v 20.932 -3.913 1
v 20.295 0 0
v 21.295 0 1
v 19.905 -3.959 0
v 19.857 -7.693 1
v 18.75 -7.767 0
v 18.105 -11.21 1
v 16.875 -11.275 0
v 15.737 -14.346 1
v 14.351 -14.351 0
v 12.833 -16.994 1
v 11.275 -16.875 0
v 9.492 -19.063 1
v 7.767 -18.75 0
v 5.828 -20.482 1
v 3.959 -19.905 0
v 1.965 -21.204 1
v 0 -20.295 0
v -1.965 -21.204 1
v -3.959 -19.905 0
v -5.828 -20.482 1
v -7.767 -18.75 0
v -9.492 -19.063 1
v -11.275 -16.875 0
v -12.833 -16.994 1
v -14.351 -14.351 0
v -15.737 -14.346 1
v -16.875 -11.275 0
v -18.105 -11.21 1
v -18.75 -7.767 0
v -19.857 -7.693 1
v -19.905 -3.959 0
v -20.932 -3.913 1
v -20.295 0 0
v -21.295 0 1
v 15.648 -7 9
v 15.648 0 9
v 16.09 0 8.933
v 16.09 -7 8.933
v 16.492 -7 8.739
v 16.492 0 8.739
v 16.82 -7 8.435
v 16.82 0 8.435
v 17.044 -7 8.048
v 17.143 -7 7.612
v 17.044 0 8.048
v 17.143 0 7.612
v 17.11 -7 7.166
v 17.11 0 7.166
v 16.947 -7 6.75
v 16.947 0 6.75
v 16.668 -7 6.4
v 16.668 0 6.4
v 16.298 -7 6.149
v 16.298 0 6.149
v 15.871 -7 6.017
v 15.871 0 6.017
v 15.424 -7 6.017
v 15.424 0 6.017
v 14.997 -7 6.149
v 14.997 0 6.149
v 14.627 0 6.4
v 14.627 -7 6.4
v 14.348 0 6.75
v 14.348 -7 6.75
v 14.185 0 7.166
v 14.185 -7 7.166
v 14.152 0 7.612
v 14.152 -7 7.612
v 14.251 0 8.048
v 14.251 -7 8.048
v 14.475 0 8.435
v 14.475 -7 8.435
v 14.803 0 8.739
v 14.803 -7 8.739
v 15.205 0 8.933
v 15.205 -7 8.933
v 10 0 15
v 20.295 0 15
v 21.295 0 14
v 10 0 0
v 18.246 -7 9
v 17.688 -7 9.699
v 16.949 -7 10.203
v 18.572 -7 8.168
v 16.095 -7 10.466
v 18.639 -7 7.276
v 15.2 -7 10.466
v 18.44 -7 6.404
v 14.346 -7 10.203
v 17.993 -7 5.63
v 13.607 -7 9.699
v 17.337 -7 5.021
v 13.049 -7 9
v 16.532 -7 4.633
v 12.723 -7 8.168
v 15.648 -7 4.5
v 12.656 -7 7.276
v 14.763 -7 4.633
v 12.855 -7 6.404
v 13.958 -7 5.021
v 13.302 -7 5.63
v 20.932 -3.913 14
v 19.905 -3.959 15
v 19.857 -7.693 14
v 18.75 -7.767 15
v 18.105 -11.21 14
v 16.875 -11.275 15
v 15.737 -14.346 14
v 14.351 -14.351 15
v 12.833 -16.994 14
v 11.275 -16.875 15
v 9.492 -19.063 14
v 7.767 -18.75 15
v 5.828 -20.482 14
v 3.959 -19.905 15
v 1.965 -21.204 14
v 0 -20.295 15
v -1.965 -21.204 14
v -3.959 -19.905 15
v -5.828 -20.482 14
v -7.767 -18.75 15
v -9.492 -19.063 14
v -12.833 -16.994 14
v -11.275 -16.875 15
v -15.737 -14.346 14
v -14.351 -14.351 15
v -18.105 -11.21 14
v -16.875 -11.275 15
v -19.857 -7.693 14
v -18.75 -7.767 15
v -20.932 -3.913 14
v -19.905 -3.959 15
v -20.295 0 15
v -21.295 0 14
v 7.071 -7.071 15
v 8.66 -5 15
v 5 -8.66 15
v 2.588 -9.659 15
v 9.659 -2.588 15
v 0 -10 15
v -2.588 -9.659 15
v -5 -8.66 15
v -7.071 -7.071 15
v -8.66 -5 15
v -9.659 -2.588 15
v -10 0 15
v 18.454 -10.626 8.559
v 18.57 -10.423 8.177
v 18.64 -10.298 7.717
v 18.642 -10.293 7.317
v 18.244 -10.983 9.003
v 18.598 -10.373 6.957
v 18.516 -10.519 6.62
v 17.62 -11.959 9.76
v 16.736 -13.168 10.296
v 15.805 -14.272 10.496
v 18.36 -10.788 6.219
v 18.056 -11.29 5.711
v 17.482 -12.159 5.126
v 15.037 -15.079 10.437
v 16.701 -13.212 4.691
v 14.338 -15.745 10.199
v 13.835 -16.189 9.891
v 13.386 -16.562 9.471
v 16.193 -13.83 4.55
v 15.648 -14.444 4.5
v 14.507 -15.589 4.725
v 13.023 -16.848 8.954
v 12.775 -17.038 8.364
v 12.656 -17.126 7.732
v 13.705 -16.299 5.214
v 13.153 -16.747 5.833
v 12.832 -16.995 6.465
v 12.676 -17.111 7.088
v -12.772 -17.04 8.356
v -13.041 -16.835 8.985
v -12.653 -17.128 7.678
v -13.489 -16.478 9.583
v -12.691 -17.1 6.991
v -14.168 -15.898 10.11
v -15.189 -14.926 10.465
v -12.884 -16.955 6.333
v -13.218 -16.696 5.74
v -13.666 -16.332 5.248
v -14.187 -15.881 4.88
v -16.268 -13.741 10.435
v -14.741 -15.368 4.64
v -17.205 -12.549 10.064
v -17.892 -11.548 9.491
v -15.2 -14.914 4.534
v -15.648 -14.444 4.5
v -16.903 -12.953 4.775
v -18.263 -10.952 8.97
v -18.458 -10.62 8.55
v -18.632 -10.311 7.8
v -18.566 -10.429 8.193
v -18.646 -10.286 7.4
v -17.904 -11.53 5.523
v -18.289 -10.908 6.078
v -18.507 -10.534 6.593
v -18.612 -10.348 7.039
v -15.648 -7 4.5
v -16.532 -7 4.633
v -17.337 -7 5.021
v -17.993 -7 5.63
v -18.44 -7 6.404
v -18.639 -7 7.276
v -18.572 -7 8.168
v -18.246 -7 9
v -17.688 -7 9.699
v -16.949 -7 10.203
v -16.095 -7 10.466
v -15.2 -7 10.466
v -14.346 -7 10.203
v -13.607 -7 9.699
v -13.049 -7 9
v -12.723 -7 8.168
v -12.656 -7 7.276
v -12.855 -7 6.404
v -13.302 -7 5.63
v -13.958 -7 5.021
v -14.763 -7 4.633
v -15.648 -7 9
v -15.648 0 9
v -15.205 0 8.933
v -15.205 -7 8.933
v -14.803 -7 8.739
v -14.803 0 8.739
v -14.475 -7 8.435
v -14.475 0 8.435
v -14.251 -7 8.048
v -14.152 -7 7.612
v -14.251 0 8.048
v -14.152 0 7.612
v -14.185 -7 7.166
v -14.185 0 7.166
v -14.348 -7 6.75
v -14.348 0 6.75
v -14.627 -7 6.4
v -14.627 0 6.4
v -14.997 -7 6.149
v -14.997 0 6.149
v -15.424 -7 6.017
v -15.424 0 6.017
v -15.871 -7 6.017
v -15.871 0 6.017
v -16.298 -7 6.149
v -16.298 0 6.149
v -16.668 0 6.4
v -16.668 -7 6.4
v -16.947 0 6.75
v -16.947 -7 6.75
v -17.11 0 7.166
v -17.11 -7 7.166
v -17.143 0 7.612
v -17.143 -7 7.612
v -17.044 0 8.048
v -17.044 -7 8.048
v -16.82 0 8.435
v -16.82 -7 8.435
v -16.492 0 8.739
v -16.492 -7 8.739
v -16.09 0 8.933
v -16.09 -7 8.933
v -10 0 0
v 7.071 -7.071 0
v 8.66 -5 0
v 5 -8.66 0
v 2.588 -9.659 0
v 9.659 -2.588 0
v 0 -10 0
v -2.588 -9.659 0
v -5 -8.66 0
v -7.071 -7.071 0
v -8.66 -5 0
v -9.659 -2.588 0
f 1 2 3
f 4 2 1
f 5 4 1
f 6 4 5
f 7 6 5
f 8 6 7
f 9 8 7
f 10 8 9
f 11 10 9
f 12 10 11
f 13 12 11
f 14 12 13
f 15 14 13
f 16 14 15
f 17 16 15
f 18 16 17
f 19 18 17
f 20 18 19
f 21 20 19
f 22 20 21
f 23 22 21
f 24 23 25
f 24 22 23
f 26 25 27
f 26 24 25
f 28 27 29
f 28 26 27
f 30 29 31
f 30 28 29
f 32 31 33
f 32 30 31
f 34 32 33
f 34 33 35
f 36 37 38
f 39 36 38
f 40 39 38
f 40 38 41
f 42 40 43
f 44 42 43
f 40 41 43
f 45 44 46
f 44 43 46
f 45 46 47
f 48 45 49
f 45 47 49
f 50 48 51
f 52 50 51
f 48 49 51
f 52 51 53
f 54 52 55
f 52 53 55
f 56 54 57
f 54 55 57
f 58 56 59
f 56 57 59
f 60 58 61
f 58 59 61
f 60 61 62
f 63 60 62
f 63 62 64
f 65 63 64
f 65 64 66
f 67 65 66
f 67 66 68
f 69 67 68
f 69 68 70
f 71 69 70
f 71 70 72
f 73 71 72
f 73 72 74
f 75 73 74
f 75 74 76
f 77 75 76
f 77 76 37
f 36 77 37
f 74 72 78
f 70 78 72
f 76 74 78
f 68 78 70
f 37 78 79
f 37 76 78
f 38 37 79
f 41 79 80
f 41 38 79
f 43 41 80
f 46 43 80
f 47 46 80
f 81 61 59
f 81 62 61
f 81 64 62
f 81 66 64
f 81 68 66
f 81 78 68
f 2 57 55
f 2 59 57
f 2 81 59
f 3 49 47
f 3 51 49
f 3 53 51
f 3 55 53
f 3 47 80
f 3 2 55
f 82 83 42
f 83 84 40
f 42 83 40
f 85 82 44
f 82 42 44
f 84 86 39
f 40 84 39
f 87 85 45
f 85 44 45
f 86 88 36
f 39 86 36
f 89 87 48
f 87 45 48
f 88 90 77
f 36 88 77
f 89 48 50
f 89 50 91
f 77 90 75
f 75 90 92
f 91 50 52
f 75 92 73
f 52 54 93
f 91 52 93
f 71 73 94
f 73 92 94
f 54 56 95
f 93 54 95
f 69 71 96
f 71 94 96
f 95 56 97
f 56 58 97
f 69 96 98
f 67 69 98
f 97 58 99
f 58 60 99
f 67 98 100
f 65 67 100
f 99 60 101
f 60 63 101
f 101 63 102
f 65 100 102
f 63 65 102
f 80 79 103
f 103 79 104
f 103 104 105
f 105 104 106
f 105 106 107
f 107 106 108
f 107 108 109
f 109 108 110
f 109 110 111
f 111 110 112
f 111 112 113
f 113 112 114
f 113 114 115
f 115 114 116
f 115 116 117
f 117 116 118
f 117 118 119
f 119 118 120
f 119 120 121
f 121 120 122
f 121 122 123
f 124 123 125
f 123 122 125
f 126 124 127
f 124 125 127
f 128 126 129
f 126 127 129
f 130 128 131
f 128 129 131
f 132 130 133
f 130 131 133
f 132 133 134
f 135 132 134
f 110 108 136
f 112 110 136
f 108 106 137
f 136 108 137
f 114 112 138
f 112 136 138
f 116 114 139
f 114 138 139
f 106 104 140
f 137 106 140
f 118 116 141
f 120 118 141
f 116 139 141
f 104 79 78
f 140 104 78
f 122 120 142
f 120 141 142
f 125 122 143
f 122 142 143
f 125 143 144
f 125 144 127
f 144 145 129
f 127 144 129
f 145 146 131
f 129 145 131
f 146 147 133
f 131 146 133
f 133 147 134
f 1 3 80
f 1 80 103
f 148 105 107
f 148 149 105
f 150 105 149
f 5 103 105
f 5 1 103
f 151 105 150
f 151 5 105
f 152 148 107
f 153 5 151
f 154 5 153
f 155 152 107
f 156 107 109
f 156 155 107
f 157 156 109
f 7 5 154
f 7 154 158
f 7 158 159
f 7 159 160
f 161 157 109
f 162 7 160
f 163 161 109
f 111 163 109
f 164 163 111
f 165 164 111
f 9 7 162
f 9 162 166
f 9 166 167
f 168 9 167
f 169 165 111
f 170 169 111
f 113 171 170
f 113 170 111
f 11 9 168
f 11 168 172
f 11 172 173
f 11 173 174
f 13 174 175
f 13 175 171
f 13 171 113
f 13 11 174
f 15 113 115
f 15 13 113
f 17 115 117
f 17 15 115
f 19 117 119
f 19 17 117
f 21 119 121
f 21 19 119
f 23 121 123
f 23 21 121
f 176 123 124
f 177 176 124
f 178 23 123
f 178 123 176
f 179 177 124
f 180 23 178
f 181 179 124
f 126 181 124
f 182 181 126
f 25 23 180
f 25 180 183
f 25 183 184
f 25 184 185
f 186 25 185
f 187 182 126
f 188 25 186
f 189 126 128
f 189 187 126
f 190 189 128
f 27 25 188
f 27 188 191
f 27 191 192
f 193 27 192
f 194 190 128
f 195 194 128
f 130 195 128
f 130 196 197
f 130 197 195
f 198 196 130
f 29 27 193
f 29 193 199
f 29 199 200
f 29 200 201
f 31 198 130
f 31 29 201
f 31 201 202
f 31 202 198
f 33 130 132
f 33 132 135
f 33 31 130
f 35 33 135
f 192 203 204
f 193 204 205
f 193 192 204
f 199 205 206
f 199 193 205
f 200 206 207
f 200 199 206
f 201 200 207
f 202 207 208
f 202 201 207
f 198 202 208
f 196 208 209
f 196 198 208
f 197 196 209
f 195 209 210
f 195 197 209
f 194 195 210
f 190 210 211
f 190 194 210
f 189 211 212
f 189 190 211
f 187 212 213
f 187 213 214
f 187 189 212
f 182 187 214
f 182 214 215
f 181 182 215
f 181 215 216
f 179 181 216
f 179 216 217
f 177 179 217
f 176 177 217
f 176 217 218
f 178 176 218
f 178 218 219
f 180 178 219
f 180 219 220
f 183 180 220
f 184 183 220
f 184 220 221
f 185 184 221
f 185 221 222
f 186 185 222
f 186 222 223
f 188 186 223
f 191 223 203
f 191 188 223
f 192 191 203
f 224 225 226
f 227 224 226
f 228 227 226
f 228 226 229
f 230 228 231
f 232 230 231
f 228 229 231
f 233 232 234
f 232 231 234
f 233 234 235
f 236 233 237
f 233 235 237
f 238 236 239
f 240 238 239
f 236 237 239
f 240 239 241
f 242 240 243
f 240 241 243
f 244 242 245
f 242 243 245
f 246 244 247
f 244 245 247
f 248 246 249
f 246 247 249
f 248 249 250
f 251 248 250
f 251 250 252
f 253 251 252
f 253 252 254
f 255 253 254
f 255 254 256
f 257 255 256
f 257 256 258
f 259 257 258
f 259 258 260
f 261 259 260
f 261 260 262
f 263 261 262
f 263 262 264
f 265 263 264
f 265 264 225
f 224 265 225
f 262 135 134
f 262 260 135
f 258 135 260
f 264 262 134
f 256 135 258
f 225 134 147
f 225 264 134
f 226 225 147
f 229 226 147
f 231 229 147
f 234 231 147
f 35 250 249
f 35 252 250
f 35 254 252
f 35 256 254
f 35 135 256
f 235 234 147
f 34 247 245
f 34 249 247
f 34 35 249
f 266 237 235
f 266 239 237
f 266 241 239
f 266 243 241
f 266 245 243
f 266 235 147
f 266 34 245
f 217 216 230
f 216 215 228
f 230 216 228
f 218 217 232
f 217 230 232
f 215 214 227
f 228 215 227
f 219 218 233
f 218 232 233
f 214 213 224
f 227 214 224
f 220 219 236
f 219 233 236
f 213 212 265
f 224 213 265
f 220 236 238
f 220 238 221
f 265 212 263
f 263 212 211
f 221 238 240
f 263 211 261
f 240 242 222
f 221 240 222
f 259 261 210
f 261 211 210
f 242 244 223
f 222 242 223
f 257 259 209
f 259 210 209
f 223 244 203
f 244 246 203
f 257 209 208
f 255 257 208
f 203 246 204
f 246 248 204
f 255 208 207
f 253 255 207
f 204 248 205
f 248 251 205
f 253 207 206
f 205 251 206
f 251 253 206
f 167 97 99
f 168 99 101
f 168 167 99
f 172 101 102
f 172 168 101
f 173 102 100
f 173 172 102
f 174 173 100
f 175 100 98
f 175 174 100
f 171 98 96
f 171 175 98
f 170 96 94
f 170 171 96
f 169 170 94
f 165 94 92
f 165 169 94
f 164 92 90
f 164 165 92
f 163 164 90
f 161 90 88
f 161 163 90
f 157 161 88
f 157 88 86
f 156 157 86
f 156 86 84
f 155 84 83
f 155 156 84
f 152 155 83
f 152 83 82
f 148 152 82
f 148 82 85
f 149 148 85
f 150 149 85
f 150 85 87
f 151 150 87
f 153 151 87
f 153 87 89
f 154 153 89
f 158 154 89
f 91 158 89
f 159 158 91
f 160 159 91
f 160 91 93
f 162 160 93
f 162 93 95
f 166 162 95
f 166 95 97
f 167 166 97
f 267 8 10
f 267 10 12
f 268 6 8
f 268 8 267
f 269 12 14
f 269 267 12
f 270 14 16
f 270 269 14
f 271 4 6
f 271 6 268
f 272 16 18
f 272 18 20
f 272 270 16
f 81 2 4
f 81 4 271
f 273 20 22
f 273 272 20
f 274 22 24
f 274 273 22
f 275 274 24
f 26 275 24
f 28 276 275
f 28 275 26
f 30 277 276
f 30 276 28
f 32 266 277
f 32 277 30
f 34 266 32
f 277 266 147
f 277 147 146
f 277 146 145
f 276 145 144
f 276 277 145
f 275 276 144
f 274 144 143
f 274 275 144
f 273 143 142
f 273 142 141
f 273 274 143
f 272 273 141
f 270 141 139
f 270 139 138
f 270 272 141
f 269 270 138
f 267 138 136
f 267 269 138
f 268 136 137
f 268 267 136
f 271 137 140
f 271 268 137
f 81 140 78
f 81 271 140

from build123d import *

# Parameters (mm, degrees)
EXTRUDE_1_DEPTH     = 15
SKETCH_2_R          = 1.5
CUT_EXTRUDE_1_DEPTH = 34
SKETCH_3_R          = 3
CUT_EXTRUDE_2_DEPTH = 18
CHAMFER_1_SIZE      = 1


with BuildPart() as part:
    # 草图1 → 凸台-拉伸1 (new body)
    with BuildSketch(Plane.XY):
        with BuildLine():
            Line((-21.295, 0), (-10, 0))
            ThreePointArc((-10, 0), (0, -10), (10, 0))
            Line((10, 0), (21.295, 0))
            ThreePointArc((21.295, 0), (0, -21.295), (-21.295, 0))
        make_face()
    extrude(amount=EXTRUDE_1_DEPTH)

    # 草图2 → 切除-拉伸1 (cut)
    with BuildSketch(Plane(origin=(0, 0, 0), x_dir=(1, 0, 0), z_dir=(0, 1, 0))):
        with Locations(Location((-15.6475, -7.5, 0), (0, 0, 270))):
            Circle(SKETCH_2_R)
        with Locations(Location((15.6475, -7.5, 0), (0, 0, 270))):
            Circle(SKETCH_2_R)
    extrude(amount=-CUT_EXTRUDE_1_DEPTH, mode=Mode.SUBTRACT)

    # 草图3 → 切除-拉伸2 (cut)
    with BuildSketch(Plane(origin=(0, -25, 0), x_dir=(1, 0, 0), z_dir=(0, 1, 0))):
        with Locations(Location((-15.6475, -7.5, 0), (0, 0, 90))):
            Circle(SKETCH_3_R)
        with Locations(Location((15.6475, -7.5, 0), (0, 0, 90))):
            Circle(SKETCH_3_R)
    extrude(amount=CUT_EXTRUDE_2_DEPTH, mode=Mode.SUBTRACT)

    # 倒角1
    chamfer_1_edges = [part.edges().sort_by_distance(p)[0] for p in [
        (0, -21.295, 15),
        (0, -21.295, 0),
    ]]
    chamfer(chamfer_1_edges, length=CHAMFER_1_SIZE)


solid = part.part
